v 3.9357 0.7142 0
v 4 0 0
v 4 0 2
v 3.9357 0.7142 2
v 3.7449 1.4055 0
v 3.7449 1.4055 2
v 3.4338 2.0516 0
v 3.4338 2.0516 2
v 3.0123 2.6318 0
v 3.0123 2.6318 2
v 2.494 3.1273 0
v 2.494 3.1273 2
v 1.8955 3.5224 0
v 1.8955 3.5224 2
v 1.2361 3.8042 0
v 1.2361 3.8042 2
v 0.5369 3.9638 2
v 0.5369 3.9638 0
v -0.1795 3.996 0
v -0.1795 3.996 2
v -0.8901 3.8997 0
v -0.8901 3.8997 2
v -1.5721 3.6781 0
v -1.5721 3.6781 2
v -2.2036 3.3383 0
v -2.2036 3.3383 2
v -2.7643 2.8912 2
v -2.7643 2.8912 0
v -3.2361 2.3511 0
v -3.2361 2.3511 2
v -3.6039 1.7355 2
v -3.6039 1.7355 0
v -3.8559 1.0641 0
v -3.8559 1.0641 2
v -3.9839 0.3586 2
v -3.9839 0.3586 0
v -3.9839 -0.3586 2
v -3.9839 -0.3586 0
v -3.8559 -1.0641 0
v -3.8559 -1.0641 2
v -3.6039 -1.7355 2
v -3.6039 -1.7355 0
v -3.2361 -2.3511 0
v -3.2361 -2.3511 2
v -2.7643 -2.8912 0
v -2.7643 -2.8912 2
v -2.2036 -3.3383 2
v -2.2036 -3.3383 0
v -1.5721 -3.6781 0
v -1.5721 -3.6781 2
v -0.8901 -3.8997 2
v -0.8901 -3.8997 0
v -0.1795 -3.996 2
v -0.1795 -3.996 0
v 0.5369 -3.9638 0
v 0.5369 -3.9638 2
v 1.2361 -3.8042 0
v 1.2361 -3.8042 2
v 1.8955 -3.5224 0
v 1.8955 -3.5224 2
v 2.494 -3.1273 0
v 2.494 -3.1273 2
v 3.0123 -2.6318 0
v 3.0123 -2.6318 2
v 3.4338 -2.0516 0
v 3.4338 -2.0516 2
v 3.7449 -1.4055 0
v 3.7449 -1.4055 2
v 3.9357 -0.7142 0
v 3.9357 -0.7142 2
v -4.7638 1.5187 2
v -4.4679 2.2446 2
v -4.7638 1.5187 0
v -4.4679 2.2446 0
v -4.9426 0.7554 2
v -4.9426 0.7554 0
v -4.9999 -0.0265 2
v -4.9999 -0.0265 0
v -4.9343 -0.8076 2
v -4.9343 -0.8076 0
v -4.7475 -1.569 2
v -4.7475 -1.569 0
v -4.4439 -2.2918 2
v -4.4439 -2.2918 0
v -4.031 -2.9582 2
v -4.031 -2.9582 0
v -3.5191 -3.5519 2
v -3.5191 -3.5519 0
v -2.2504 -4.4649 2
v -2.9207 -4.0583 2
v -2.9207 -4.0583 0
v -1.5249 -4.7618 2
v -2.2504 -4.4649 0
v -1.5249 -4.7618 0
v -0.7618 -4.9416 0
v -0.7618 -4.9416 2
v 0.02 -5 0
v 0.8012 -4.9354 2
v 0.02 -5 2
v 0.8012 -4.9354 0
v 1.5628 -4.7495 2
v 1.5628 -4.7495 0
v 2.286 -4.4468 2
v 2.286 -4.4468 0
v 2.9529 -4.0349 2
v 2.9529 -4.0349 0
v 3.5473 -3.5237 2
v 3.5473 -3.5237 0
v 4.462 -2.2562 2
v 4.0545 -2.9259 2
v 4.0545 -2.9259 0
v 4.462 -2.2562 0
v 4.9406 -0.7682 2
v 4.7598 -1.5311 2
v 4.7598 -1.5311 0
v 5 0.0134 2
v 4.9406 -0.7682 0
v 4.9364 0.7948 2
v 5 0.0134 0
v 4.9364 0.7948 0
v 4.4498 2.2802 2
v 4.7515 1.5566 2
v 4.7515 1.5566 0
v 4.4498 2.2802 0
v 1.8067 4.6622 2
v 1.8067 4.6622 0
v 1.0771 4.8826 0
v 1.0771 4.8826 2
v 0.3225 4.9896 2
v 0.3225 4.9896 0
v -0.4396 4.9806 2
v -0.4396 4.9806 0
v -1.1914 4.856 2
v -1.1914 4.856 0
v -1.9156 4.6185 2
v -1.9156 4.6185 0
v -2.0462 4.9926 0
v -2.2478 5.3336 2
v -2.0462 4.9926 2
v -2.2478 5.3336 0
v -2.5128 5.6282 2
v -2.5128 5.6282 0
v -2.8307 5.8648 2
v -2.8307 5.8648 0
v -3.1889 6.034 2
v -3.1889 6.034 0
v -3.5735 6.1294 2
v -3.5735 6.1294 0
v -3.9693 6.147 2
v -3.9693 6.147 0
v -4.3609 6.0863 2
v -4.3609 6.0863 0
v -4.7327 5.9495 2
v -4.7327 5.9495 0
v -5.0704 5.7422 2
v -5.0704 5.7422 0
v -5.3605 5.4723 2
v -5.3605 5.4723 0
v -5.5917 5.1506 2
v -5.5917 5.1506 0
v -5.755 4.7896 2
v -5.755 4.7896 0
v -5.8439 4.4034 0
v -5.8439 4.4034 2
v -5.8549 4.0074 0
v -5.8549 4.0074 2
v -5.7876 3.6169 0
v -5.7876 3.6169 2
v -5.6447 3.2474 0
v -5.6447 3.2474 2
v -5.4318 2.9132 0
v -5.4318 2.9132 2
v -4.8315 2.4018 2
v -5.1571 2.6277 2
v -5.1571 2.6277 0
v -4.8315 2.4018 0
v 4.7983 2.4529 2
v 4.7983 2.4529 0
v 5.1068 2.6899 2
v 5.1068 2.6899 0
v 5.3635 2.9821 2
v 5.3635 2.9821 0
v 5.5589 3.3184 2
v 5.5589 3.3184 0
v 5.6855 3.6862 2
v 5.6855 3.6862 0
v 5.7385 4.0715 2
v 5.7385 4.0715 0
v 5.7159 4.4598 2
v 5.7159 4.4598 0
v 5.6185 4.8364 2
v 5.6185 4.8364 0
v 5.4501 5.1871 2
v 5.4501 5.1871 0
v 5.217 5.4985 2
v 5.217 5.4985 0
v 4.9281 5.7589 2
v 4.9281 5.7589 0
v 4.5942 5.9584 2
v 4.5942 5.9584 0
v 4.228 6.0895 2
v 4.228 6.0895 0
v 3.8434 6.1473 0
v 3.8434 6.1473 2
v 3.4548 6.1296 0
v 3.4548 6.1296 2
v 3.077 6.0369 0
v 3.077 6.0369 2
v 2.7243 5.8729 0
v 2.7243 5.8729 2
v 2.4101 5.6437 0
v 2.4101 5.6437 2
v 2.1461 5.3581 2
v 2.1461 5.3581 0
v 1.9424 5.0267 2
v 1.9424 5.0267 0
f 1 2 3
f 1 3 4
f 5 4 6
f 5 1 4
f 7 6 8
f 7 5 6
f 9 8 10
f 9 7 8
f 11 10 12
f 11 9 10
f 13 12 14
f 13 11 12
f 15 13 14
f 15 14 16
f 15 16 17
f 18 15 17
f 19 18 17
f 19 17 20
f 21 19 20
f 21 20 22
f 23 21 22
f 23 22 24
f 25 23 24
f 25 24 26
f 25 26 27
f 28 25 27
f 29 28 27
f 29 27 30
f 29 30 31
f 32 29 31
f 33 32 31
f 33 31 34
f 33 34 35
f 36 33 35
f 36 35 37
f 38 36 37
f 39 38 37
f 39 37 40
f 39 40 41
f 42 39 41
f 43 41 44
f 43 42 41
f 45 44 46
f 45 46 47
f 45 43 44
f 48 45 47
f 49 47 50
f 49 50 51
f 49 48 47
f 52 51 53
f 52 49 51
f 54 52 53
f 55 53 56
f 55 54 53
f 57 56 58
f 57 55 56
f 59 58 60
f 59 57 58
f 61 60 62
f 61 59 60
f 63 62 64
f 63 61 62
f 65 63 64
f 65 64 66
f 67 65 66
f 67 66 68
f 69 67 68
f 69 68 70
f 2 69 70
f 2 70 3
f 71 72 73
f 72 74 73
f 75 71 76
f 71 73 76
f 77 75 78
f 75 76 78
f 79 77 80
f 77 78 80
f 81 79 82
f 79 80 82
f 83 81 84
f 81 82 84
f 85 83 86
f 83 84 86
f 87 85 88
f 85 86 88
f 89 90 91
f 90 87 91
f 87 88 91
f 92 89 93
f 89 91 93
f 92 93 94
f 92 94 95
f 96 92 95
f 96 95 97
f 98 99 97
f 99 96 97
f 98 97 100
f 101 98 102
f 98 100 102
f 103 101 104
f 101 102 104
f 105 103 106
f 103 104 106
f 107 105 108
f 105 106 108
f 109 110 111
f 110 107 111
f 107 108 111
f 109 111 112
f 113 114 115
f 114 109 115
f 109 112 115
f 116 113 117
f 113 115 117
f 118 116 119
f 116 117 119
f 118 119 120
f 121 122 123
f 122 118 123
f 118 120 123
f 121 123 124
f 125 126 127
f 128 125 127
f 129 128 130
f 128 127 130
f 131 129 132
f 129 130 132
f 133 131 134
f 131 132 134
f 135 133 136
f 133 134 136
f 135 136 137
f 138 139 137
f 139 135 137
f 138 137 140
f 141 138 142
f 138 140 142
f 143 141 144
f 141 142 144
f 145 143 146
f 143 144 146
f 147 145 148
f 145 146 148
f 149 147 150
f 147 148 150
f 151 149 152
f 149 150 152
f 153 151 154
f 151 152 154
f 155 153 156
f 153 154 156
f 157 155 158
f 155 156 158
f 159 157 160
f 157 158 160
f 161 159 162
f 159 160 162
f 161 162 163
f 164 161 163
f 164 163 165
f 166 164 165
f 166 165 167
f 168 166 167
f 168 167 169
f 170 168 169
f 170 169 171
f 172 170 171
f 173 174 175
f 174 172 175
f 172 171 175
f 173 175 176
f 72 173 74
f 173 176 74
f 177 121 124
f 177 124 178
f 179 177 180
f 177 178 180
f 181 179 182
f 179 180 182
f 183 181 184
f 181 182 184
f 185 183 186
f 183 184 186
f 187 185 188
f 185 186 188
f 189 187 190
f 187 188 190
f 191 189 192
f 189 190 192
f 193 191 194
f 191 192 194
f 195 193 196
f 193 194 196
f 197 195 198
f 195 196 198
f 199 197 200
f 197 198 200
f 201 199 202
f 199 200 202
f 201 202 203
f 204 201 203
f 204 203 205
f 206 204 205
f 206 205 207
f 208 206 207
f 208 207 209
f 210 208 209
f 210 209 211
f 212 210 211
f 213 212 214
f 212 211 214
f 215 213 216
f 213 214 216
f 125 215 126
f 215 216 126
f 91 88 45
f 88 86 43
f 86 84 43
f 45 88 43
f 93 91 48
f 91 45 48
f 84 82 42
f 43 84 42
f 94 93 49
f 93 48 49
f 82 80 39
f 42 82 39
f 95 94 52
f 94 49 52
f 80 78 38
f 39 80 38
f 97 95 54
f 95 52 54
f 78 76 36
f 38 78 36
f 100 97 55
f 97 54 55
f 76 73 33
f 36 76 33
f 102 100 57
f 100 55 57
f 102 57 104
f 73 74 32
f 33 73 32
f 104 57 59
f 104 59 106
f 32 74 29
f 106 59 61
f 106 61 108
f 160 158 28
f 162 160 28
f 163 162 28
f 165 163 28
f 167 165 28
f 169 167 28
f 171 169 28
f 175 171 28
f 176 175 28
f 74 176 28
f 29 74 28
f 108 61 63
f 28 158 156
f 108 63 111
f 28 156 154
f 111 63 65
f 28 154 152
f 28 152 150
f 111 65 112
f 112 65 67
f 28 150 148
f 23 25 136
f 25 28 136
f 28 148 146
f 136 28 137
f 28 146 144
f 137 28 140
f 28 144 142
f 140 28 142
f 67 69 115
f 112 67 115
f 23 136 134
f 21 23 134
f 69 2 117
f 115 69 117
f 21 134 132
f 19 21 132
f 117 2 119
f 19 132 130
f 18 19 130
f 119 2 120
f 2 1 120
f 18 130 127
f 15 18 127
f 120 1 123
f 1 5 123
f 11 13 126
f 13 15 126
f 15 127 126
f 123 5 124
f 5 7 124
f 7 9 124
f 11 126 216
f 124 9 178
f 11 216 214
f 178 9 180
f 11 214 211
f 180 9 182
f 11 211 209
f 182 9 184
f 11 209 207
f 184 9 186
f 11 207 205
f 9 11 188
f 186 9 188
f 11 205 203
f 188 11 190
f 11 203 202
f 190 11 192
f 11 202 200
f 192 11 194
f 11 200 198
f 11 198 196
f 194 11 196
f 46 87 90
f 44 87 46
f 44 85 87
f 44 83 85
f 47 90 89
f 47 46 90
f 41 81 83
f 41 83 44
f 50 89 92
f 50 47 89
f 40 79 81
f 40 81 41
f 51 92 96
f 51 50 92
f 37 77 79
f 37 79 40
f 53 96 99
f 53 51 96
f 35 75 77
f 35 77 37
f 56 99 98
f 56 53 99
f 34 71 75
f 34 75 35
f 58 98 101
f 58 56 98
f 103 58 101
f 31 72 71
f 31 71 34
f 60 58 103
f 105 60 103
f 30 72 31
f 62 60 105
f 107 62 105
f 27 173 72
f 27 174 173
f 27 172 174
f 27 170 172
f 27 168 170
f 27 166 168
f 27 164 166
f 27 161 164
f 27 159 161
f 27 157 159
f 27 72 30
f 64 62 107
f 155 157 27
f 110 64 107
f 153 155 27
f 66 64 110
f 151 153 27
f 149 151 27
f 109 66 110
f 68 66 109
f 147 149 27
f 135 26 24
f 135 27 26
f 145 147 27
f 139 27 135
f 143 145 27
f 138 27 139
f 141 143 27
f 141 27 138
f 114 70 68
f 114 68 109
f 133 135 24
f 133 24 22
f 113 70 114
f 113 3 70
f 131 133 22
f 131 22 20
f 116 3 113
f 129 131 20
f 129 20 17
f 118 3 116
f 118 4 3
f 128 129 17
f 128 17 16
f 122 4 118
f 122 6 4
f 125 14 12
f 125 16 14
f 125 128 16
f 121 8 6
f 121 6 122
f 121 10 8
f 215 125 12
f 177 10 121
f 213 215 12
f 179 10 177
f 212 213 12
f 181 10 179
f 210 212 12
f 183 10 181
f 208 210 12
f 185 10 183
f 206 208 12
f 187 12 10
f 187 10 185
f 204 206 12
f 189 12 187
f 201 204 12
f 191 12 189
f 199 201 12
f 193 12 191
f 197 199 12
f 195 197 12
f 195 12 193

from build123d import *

# Parameters (mm, degrees)
CYLINDER001_R     = 4
CYLINDER001_DEPTH = 5
CYLINDER003_R     = 2
CYLINDER003_DEPTH = 2
CYLINDER002_R     = 2
CYLINDER002_DEPTH = 2
CYLINDER_R        = 5
CYLINDER_DEPTH    = 2


with BuildPart() as interior:
    # Cylinder001 → Cylinder001 (new body)
    with BuildSketch(Plane.XY.offset(-1.53)):
        Circle(CYLINDER001_R)
    extrude(amount=CYLINDER001_DEPTH)


with BuildPart() as oreja001:
    # Cylinder003 → Cylinder003 (new body)
    with BuildSketch(Plane(origin=(3.74, 4.15, 0), x_dir=(1, 0, 0), z_dir=(0, 0, 1))):
        Circle(CYLINDER003_R)
    extrude(amount=CYLINDER003_DEPTH)


with BuildPart() as cut001:
    # Cylinder002 → Cylinder002 (new body)
    with BuildSketch(Plane(origin=(-3.86, 4.15, 0), x_dir=(1, 0, 0), z_dir=(0, 0, 1))):
        Circle(CYLINDER002_R)
    extrude(amount=CYLINDER002_DEPTH)

    # Fusion: union Oreja001
    add(oreja001.part)

    # Cut001: cut Interior
    add(interior.part, mode=Mode.SUBTRACT)


with BuildPart() as fusion001:
    # Cylinder → Cylinder (new body)
    with BuildSketch(Plane.XY):
        Circle(CYLINDER_R)
    extrude(amount=CYLINDER_DEPTH)

    # Cut: cut Interior
    add(interior.part, mode=Mode.SUBTRACT)

    # Fusion001: union Cut001
    add(cut001.part)


solid = fusion001.part
